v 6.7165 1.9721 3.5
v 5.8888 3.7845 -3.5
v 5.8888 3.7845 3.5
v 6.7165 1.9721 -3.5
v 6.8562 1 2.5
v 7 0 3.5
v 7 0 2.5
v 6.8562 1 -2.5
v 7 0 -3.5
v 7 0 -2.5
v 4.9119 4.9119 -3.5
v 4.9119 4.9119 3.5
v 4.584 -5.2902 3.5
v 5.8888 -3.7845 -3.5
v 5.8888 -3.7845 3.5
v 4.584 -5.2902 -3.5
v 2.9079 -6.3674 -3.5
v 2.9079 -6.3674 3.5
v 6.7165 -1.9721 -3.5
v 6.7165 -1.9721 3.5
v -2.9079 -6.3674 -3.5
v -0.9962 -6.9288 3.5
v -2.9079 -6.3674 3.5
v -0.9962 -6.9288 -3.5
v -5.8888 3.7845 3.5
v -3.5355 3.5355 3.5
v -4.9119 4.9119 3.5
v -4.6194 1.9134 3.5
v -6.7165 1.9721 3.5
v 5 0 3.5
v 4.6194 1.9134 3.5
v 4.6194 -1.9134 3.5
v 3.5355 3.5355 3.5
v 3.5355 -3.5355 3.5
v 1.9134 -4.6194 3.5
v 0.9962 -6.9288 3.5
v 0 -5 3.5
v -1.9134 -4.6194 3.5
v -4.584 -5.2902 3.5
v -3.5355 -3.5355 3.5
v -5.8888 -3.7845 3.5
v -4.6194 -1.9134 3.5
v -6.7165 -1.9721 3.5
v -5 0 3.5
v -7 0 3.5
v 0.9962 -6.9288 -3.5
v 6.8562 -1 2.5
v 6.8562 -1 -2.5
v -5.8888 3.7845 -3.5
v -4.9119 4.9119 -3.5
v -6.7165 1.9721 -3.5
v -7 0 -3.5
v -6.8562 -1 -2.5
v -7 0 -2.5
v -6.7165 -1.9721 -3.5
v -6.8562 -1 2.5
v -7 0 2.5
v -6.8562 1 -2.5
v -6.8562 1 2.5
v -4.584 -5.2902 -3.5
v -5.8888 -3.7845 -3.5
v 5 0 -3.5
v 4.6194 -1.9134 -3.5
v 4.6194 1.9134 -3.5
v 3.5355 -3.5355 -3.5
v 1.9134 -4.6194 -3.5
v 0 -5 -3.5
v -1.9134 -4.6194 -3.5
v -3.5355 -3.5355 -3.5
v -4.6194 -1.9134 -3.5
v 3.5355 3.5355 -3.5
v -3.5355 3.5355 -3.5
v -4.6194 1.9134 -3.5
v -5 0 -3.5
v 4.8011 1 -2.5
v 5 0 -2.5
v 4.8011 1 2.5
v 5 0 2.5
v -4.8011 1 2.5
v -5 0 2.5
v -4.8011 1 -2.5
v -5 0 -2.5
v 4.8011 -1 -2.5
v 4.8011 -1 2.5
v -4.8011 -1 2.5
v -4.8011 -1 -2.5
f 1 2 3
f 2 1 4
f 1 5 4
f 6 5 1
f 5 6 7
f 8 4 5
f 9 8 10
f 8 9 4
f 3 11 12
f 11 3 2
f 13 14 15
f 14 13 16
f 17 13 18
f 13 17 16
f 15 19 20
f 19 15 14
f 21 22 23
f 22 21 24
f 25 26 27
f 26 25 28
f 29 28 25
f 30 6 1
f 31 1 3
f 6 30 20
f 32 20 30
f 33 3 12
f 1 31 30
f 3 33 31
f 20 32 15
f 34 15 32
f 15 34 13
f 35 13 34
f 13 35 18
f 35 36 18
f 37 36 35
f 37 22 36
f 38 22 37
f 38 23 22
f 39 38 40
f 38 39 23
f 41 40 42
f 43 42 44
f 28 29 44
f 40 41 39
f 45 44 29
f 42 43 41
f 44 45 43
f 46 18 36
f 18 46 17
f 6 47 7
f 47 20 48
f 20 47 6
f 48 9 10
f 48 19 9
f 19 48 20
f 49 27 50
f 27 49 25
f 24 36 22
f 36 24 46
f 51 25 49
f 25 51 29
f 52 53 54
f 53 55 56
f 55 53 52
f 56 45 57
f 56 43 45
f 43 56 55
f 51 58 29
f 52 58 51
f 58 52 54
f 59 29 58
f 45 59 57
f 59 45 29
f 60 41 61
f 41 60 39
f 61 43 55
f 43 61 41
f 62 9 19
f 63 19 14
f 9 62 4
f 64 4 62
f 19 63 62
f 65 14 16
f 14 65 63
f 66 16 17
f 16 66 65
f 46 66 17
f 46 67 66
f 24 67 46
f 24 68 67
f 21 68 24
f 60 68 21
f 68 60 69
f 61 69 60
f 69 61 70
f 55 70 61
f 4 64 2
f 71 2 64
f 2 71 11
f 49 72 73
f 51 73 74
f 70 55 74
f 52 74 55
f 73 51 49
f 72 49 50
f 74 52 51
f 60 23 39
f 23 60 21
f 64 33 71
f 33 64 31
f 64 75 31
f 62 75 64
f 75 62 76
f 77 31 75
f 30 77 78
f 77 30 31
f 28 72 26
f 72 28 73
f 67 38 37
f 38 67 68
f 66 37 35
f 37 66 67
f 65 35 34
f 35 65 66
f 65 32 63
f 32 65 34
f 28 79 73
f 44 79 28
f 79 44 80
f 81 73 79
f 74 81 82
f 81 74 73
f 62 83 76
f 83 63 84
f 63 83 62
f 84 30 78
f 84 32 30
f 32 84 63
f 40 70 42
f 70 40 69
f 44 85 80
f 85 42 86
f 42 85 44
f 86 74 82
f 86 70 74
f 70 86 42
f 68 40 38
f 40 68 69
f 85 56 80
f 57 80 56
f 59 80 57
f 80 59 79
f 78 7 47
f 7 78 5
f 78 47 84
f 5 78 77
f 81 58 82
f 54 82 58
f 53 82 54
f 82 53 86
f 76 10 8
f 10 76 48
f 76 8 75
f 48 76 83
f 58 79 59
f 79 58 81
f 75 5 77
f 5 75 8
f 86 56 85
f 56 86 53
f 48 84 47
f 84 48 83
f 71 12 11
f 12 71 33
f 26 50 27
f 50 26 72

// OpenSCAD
innerradius = 5; // [0:100]
wallthickness = 2; // [0:10]
radius = innerradius+wallthickness;

height = 7; // [0:15]

cable_binder_width_plus_margin = 5; // [0:10]
cable_binder_height_plus_margin = 2; // [0:10]
cable_binder_position_in_percent = 50; // [0:100]

open_top = "yes"; // [yes,no]
opening_angle = 90; // // [0:360]



// from http://rocklinux.net/pipermail/openscad/2012-August/003170.html
// whosawhatsis
module slice(r = 10, deg = 30) { 
	degn = (deg % 360 > 0) ? deg % 360 : deg % 360 + 360;
	difference() {
		circle(r);
		if (degn > 180) 
			intersection_for(a = [0, 180 - degn]) 
				rotate(a) 
					translate([-r, 0, 0]) 
						square(r * 2); 
		else 
			union() 
				for(a = [0, 180 - degn]) 
					rotate(a) 
						translate([-r, 0, 0]) 
							square(r * 2); 
	}
}



difference(){
	cylinder(h = height, r = radius, center = true);
	cylinder(h = height+2, r = innerradius, center = true);

	translate([0,-radius,0])
		translate([0,(radius*2)*cable_binder_position_in_percent/100, 0])
			cube(size = [radius*2, cable_binder_height_plus_margin, cable_binder_width_plus_margin], center = true);

if (open_top == "yes"){
	rotate(90 + opening_angle/2) 
	linear_extrude(height = height+2, center = true)
		slice(radius*2, opening_angle);
}

}




